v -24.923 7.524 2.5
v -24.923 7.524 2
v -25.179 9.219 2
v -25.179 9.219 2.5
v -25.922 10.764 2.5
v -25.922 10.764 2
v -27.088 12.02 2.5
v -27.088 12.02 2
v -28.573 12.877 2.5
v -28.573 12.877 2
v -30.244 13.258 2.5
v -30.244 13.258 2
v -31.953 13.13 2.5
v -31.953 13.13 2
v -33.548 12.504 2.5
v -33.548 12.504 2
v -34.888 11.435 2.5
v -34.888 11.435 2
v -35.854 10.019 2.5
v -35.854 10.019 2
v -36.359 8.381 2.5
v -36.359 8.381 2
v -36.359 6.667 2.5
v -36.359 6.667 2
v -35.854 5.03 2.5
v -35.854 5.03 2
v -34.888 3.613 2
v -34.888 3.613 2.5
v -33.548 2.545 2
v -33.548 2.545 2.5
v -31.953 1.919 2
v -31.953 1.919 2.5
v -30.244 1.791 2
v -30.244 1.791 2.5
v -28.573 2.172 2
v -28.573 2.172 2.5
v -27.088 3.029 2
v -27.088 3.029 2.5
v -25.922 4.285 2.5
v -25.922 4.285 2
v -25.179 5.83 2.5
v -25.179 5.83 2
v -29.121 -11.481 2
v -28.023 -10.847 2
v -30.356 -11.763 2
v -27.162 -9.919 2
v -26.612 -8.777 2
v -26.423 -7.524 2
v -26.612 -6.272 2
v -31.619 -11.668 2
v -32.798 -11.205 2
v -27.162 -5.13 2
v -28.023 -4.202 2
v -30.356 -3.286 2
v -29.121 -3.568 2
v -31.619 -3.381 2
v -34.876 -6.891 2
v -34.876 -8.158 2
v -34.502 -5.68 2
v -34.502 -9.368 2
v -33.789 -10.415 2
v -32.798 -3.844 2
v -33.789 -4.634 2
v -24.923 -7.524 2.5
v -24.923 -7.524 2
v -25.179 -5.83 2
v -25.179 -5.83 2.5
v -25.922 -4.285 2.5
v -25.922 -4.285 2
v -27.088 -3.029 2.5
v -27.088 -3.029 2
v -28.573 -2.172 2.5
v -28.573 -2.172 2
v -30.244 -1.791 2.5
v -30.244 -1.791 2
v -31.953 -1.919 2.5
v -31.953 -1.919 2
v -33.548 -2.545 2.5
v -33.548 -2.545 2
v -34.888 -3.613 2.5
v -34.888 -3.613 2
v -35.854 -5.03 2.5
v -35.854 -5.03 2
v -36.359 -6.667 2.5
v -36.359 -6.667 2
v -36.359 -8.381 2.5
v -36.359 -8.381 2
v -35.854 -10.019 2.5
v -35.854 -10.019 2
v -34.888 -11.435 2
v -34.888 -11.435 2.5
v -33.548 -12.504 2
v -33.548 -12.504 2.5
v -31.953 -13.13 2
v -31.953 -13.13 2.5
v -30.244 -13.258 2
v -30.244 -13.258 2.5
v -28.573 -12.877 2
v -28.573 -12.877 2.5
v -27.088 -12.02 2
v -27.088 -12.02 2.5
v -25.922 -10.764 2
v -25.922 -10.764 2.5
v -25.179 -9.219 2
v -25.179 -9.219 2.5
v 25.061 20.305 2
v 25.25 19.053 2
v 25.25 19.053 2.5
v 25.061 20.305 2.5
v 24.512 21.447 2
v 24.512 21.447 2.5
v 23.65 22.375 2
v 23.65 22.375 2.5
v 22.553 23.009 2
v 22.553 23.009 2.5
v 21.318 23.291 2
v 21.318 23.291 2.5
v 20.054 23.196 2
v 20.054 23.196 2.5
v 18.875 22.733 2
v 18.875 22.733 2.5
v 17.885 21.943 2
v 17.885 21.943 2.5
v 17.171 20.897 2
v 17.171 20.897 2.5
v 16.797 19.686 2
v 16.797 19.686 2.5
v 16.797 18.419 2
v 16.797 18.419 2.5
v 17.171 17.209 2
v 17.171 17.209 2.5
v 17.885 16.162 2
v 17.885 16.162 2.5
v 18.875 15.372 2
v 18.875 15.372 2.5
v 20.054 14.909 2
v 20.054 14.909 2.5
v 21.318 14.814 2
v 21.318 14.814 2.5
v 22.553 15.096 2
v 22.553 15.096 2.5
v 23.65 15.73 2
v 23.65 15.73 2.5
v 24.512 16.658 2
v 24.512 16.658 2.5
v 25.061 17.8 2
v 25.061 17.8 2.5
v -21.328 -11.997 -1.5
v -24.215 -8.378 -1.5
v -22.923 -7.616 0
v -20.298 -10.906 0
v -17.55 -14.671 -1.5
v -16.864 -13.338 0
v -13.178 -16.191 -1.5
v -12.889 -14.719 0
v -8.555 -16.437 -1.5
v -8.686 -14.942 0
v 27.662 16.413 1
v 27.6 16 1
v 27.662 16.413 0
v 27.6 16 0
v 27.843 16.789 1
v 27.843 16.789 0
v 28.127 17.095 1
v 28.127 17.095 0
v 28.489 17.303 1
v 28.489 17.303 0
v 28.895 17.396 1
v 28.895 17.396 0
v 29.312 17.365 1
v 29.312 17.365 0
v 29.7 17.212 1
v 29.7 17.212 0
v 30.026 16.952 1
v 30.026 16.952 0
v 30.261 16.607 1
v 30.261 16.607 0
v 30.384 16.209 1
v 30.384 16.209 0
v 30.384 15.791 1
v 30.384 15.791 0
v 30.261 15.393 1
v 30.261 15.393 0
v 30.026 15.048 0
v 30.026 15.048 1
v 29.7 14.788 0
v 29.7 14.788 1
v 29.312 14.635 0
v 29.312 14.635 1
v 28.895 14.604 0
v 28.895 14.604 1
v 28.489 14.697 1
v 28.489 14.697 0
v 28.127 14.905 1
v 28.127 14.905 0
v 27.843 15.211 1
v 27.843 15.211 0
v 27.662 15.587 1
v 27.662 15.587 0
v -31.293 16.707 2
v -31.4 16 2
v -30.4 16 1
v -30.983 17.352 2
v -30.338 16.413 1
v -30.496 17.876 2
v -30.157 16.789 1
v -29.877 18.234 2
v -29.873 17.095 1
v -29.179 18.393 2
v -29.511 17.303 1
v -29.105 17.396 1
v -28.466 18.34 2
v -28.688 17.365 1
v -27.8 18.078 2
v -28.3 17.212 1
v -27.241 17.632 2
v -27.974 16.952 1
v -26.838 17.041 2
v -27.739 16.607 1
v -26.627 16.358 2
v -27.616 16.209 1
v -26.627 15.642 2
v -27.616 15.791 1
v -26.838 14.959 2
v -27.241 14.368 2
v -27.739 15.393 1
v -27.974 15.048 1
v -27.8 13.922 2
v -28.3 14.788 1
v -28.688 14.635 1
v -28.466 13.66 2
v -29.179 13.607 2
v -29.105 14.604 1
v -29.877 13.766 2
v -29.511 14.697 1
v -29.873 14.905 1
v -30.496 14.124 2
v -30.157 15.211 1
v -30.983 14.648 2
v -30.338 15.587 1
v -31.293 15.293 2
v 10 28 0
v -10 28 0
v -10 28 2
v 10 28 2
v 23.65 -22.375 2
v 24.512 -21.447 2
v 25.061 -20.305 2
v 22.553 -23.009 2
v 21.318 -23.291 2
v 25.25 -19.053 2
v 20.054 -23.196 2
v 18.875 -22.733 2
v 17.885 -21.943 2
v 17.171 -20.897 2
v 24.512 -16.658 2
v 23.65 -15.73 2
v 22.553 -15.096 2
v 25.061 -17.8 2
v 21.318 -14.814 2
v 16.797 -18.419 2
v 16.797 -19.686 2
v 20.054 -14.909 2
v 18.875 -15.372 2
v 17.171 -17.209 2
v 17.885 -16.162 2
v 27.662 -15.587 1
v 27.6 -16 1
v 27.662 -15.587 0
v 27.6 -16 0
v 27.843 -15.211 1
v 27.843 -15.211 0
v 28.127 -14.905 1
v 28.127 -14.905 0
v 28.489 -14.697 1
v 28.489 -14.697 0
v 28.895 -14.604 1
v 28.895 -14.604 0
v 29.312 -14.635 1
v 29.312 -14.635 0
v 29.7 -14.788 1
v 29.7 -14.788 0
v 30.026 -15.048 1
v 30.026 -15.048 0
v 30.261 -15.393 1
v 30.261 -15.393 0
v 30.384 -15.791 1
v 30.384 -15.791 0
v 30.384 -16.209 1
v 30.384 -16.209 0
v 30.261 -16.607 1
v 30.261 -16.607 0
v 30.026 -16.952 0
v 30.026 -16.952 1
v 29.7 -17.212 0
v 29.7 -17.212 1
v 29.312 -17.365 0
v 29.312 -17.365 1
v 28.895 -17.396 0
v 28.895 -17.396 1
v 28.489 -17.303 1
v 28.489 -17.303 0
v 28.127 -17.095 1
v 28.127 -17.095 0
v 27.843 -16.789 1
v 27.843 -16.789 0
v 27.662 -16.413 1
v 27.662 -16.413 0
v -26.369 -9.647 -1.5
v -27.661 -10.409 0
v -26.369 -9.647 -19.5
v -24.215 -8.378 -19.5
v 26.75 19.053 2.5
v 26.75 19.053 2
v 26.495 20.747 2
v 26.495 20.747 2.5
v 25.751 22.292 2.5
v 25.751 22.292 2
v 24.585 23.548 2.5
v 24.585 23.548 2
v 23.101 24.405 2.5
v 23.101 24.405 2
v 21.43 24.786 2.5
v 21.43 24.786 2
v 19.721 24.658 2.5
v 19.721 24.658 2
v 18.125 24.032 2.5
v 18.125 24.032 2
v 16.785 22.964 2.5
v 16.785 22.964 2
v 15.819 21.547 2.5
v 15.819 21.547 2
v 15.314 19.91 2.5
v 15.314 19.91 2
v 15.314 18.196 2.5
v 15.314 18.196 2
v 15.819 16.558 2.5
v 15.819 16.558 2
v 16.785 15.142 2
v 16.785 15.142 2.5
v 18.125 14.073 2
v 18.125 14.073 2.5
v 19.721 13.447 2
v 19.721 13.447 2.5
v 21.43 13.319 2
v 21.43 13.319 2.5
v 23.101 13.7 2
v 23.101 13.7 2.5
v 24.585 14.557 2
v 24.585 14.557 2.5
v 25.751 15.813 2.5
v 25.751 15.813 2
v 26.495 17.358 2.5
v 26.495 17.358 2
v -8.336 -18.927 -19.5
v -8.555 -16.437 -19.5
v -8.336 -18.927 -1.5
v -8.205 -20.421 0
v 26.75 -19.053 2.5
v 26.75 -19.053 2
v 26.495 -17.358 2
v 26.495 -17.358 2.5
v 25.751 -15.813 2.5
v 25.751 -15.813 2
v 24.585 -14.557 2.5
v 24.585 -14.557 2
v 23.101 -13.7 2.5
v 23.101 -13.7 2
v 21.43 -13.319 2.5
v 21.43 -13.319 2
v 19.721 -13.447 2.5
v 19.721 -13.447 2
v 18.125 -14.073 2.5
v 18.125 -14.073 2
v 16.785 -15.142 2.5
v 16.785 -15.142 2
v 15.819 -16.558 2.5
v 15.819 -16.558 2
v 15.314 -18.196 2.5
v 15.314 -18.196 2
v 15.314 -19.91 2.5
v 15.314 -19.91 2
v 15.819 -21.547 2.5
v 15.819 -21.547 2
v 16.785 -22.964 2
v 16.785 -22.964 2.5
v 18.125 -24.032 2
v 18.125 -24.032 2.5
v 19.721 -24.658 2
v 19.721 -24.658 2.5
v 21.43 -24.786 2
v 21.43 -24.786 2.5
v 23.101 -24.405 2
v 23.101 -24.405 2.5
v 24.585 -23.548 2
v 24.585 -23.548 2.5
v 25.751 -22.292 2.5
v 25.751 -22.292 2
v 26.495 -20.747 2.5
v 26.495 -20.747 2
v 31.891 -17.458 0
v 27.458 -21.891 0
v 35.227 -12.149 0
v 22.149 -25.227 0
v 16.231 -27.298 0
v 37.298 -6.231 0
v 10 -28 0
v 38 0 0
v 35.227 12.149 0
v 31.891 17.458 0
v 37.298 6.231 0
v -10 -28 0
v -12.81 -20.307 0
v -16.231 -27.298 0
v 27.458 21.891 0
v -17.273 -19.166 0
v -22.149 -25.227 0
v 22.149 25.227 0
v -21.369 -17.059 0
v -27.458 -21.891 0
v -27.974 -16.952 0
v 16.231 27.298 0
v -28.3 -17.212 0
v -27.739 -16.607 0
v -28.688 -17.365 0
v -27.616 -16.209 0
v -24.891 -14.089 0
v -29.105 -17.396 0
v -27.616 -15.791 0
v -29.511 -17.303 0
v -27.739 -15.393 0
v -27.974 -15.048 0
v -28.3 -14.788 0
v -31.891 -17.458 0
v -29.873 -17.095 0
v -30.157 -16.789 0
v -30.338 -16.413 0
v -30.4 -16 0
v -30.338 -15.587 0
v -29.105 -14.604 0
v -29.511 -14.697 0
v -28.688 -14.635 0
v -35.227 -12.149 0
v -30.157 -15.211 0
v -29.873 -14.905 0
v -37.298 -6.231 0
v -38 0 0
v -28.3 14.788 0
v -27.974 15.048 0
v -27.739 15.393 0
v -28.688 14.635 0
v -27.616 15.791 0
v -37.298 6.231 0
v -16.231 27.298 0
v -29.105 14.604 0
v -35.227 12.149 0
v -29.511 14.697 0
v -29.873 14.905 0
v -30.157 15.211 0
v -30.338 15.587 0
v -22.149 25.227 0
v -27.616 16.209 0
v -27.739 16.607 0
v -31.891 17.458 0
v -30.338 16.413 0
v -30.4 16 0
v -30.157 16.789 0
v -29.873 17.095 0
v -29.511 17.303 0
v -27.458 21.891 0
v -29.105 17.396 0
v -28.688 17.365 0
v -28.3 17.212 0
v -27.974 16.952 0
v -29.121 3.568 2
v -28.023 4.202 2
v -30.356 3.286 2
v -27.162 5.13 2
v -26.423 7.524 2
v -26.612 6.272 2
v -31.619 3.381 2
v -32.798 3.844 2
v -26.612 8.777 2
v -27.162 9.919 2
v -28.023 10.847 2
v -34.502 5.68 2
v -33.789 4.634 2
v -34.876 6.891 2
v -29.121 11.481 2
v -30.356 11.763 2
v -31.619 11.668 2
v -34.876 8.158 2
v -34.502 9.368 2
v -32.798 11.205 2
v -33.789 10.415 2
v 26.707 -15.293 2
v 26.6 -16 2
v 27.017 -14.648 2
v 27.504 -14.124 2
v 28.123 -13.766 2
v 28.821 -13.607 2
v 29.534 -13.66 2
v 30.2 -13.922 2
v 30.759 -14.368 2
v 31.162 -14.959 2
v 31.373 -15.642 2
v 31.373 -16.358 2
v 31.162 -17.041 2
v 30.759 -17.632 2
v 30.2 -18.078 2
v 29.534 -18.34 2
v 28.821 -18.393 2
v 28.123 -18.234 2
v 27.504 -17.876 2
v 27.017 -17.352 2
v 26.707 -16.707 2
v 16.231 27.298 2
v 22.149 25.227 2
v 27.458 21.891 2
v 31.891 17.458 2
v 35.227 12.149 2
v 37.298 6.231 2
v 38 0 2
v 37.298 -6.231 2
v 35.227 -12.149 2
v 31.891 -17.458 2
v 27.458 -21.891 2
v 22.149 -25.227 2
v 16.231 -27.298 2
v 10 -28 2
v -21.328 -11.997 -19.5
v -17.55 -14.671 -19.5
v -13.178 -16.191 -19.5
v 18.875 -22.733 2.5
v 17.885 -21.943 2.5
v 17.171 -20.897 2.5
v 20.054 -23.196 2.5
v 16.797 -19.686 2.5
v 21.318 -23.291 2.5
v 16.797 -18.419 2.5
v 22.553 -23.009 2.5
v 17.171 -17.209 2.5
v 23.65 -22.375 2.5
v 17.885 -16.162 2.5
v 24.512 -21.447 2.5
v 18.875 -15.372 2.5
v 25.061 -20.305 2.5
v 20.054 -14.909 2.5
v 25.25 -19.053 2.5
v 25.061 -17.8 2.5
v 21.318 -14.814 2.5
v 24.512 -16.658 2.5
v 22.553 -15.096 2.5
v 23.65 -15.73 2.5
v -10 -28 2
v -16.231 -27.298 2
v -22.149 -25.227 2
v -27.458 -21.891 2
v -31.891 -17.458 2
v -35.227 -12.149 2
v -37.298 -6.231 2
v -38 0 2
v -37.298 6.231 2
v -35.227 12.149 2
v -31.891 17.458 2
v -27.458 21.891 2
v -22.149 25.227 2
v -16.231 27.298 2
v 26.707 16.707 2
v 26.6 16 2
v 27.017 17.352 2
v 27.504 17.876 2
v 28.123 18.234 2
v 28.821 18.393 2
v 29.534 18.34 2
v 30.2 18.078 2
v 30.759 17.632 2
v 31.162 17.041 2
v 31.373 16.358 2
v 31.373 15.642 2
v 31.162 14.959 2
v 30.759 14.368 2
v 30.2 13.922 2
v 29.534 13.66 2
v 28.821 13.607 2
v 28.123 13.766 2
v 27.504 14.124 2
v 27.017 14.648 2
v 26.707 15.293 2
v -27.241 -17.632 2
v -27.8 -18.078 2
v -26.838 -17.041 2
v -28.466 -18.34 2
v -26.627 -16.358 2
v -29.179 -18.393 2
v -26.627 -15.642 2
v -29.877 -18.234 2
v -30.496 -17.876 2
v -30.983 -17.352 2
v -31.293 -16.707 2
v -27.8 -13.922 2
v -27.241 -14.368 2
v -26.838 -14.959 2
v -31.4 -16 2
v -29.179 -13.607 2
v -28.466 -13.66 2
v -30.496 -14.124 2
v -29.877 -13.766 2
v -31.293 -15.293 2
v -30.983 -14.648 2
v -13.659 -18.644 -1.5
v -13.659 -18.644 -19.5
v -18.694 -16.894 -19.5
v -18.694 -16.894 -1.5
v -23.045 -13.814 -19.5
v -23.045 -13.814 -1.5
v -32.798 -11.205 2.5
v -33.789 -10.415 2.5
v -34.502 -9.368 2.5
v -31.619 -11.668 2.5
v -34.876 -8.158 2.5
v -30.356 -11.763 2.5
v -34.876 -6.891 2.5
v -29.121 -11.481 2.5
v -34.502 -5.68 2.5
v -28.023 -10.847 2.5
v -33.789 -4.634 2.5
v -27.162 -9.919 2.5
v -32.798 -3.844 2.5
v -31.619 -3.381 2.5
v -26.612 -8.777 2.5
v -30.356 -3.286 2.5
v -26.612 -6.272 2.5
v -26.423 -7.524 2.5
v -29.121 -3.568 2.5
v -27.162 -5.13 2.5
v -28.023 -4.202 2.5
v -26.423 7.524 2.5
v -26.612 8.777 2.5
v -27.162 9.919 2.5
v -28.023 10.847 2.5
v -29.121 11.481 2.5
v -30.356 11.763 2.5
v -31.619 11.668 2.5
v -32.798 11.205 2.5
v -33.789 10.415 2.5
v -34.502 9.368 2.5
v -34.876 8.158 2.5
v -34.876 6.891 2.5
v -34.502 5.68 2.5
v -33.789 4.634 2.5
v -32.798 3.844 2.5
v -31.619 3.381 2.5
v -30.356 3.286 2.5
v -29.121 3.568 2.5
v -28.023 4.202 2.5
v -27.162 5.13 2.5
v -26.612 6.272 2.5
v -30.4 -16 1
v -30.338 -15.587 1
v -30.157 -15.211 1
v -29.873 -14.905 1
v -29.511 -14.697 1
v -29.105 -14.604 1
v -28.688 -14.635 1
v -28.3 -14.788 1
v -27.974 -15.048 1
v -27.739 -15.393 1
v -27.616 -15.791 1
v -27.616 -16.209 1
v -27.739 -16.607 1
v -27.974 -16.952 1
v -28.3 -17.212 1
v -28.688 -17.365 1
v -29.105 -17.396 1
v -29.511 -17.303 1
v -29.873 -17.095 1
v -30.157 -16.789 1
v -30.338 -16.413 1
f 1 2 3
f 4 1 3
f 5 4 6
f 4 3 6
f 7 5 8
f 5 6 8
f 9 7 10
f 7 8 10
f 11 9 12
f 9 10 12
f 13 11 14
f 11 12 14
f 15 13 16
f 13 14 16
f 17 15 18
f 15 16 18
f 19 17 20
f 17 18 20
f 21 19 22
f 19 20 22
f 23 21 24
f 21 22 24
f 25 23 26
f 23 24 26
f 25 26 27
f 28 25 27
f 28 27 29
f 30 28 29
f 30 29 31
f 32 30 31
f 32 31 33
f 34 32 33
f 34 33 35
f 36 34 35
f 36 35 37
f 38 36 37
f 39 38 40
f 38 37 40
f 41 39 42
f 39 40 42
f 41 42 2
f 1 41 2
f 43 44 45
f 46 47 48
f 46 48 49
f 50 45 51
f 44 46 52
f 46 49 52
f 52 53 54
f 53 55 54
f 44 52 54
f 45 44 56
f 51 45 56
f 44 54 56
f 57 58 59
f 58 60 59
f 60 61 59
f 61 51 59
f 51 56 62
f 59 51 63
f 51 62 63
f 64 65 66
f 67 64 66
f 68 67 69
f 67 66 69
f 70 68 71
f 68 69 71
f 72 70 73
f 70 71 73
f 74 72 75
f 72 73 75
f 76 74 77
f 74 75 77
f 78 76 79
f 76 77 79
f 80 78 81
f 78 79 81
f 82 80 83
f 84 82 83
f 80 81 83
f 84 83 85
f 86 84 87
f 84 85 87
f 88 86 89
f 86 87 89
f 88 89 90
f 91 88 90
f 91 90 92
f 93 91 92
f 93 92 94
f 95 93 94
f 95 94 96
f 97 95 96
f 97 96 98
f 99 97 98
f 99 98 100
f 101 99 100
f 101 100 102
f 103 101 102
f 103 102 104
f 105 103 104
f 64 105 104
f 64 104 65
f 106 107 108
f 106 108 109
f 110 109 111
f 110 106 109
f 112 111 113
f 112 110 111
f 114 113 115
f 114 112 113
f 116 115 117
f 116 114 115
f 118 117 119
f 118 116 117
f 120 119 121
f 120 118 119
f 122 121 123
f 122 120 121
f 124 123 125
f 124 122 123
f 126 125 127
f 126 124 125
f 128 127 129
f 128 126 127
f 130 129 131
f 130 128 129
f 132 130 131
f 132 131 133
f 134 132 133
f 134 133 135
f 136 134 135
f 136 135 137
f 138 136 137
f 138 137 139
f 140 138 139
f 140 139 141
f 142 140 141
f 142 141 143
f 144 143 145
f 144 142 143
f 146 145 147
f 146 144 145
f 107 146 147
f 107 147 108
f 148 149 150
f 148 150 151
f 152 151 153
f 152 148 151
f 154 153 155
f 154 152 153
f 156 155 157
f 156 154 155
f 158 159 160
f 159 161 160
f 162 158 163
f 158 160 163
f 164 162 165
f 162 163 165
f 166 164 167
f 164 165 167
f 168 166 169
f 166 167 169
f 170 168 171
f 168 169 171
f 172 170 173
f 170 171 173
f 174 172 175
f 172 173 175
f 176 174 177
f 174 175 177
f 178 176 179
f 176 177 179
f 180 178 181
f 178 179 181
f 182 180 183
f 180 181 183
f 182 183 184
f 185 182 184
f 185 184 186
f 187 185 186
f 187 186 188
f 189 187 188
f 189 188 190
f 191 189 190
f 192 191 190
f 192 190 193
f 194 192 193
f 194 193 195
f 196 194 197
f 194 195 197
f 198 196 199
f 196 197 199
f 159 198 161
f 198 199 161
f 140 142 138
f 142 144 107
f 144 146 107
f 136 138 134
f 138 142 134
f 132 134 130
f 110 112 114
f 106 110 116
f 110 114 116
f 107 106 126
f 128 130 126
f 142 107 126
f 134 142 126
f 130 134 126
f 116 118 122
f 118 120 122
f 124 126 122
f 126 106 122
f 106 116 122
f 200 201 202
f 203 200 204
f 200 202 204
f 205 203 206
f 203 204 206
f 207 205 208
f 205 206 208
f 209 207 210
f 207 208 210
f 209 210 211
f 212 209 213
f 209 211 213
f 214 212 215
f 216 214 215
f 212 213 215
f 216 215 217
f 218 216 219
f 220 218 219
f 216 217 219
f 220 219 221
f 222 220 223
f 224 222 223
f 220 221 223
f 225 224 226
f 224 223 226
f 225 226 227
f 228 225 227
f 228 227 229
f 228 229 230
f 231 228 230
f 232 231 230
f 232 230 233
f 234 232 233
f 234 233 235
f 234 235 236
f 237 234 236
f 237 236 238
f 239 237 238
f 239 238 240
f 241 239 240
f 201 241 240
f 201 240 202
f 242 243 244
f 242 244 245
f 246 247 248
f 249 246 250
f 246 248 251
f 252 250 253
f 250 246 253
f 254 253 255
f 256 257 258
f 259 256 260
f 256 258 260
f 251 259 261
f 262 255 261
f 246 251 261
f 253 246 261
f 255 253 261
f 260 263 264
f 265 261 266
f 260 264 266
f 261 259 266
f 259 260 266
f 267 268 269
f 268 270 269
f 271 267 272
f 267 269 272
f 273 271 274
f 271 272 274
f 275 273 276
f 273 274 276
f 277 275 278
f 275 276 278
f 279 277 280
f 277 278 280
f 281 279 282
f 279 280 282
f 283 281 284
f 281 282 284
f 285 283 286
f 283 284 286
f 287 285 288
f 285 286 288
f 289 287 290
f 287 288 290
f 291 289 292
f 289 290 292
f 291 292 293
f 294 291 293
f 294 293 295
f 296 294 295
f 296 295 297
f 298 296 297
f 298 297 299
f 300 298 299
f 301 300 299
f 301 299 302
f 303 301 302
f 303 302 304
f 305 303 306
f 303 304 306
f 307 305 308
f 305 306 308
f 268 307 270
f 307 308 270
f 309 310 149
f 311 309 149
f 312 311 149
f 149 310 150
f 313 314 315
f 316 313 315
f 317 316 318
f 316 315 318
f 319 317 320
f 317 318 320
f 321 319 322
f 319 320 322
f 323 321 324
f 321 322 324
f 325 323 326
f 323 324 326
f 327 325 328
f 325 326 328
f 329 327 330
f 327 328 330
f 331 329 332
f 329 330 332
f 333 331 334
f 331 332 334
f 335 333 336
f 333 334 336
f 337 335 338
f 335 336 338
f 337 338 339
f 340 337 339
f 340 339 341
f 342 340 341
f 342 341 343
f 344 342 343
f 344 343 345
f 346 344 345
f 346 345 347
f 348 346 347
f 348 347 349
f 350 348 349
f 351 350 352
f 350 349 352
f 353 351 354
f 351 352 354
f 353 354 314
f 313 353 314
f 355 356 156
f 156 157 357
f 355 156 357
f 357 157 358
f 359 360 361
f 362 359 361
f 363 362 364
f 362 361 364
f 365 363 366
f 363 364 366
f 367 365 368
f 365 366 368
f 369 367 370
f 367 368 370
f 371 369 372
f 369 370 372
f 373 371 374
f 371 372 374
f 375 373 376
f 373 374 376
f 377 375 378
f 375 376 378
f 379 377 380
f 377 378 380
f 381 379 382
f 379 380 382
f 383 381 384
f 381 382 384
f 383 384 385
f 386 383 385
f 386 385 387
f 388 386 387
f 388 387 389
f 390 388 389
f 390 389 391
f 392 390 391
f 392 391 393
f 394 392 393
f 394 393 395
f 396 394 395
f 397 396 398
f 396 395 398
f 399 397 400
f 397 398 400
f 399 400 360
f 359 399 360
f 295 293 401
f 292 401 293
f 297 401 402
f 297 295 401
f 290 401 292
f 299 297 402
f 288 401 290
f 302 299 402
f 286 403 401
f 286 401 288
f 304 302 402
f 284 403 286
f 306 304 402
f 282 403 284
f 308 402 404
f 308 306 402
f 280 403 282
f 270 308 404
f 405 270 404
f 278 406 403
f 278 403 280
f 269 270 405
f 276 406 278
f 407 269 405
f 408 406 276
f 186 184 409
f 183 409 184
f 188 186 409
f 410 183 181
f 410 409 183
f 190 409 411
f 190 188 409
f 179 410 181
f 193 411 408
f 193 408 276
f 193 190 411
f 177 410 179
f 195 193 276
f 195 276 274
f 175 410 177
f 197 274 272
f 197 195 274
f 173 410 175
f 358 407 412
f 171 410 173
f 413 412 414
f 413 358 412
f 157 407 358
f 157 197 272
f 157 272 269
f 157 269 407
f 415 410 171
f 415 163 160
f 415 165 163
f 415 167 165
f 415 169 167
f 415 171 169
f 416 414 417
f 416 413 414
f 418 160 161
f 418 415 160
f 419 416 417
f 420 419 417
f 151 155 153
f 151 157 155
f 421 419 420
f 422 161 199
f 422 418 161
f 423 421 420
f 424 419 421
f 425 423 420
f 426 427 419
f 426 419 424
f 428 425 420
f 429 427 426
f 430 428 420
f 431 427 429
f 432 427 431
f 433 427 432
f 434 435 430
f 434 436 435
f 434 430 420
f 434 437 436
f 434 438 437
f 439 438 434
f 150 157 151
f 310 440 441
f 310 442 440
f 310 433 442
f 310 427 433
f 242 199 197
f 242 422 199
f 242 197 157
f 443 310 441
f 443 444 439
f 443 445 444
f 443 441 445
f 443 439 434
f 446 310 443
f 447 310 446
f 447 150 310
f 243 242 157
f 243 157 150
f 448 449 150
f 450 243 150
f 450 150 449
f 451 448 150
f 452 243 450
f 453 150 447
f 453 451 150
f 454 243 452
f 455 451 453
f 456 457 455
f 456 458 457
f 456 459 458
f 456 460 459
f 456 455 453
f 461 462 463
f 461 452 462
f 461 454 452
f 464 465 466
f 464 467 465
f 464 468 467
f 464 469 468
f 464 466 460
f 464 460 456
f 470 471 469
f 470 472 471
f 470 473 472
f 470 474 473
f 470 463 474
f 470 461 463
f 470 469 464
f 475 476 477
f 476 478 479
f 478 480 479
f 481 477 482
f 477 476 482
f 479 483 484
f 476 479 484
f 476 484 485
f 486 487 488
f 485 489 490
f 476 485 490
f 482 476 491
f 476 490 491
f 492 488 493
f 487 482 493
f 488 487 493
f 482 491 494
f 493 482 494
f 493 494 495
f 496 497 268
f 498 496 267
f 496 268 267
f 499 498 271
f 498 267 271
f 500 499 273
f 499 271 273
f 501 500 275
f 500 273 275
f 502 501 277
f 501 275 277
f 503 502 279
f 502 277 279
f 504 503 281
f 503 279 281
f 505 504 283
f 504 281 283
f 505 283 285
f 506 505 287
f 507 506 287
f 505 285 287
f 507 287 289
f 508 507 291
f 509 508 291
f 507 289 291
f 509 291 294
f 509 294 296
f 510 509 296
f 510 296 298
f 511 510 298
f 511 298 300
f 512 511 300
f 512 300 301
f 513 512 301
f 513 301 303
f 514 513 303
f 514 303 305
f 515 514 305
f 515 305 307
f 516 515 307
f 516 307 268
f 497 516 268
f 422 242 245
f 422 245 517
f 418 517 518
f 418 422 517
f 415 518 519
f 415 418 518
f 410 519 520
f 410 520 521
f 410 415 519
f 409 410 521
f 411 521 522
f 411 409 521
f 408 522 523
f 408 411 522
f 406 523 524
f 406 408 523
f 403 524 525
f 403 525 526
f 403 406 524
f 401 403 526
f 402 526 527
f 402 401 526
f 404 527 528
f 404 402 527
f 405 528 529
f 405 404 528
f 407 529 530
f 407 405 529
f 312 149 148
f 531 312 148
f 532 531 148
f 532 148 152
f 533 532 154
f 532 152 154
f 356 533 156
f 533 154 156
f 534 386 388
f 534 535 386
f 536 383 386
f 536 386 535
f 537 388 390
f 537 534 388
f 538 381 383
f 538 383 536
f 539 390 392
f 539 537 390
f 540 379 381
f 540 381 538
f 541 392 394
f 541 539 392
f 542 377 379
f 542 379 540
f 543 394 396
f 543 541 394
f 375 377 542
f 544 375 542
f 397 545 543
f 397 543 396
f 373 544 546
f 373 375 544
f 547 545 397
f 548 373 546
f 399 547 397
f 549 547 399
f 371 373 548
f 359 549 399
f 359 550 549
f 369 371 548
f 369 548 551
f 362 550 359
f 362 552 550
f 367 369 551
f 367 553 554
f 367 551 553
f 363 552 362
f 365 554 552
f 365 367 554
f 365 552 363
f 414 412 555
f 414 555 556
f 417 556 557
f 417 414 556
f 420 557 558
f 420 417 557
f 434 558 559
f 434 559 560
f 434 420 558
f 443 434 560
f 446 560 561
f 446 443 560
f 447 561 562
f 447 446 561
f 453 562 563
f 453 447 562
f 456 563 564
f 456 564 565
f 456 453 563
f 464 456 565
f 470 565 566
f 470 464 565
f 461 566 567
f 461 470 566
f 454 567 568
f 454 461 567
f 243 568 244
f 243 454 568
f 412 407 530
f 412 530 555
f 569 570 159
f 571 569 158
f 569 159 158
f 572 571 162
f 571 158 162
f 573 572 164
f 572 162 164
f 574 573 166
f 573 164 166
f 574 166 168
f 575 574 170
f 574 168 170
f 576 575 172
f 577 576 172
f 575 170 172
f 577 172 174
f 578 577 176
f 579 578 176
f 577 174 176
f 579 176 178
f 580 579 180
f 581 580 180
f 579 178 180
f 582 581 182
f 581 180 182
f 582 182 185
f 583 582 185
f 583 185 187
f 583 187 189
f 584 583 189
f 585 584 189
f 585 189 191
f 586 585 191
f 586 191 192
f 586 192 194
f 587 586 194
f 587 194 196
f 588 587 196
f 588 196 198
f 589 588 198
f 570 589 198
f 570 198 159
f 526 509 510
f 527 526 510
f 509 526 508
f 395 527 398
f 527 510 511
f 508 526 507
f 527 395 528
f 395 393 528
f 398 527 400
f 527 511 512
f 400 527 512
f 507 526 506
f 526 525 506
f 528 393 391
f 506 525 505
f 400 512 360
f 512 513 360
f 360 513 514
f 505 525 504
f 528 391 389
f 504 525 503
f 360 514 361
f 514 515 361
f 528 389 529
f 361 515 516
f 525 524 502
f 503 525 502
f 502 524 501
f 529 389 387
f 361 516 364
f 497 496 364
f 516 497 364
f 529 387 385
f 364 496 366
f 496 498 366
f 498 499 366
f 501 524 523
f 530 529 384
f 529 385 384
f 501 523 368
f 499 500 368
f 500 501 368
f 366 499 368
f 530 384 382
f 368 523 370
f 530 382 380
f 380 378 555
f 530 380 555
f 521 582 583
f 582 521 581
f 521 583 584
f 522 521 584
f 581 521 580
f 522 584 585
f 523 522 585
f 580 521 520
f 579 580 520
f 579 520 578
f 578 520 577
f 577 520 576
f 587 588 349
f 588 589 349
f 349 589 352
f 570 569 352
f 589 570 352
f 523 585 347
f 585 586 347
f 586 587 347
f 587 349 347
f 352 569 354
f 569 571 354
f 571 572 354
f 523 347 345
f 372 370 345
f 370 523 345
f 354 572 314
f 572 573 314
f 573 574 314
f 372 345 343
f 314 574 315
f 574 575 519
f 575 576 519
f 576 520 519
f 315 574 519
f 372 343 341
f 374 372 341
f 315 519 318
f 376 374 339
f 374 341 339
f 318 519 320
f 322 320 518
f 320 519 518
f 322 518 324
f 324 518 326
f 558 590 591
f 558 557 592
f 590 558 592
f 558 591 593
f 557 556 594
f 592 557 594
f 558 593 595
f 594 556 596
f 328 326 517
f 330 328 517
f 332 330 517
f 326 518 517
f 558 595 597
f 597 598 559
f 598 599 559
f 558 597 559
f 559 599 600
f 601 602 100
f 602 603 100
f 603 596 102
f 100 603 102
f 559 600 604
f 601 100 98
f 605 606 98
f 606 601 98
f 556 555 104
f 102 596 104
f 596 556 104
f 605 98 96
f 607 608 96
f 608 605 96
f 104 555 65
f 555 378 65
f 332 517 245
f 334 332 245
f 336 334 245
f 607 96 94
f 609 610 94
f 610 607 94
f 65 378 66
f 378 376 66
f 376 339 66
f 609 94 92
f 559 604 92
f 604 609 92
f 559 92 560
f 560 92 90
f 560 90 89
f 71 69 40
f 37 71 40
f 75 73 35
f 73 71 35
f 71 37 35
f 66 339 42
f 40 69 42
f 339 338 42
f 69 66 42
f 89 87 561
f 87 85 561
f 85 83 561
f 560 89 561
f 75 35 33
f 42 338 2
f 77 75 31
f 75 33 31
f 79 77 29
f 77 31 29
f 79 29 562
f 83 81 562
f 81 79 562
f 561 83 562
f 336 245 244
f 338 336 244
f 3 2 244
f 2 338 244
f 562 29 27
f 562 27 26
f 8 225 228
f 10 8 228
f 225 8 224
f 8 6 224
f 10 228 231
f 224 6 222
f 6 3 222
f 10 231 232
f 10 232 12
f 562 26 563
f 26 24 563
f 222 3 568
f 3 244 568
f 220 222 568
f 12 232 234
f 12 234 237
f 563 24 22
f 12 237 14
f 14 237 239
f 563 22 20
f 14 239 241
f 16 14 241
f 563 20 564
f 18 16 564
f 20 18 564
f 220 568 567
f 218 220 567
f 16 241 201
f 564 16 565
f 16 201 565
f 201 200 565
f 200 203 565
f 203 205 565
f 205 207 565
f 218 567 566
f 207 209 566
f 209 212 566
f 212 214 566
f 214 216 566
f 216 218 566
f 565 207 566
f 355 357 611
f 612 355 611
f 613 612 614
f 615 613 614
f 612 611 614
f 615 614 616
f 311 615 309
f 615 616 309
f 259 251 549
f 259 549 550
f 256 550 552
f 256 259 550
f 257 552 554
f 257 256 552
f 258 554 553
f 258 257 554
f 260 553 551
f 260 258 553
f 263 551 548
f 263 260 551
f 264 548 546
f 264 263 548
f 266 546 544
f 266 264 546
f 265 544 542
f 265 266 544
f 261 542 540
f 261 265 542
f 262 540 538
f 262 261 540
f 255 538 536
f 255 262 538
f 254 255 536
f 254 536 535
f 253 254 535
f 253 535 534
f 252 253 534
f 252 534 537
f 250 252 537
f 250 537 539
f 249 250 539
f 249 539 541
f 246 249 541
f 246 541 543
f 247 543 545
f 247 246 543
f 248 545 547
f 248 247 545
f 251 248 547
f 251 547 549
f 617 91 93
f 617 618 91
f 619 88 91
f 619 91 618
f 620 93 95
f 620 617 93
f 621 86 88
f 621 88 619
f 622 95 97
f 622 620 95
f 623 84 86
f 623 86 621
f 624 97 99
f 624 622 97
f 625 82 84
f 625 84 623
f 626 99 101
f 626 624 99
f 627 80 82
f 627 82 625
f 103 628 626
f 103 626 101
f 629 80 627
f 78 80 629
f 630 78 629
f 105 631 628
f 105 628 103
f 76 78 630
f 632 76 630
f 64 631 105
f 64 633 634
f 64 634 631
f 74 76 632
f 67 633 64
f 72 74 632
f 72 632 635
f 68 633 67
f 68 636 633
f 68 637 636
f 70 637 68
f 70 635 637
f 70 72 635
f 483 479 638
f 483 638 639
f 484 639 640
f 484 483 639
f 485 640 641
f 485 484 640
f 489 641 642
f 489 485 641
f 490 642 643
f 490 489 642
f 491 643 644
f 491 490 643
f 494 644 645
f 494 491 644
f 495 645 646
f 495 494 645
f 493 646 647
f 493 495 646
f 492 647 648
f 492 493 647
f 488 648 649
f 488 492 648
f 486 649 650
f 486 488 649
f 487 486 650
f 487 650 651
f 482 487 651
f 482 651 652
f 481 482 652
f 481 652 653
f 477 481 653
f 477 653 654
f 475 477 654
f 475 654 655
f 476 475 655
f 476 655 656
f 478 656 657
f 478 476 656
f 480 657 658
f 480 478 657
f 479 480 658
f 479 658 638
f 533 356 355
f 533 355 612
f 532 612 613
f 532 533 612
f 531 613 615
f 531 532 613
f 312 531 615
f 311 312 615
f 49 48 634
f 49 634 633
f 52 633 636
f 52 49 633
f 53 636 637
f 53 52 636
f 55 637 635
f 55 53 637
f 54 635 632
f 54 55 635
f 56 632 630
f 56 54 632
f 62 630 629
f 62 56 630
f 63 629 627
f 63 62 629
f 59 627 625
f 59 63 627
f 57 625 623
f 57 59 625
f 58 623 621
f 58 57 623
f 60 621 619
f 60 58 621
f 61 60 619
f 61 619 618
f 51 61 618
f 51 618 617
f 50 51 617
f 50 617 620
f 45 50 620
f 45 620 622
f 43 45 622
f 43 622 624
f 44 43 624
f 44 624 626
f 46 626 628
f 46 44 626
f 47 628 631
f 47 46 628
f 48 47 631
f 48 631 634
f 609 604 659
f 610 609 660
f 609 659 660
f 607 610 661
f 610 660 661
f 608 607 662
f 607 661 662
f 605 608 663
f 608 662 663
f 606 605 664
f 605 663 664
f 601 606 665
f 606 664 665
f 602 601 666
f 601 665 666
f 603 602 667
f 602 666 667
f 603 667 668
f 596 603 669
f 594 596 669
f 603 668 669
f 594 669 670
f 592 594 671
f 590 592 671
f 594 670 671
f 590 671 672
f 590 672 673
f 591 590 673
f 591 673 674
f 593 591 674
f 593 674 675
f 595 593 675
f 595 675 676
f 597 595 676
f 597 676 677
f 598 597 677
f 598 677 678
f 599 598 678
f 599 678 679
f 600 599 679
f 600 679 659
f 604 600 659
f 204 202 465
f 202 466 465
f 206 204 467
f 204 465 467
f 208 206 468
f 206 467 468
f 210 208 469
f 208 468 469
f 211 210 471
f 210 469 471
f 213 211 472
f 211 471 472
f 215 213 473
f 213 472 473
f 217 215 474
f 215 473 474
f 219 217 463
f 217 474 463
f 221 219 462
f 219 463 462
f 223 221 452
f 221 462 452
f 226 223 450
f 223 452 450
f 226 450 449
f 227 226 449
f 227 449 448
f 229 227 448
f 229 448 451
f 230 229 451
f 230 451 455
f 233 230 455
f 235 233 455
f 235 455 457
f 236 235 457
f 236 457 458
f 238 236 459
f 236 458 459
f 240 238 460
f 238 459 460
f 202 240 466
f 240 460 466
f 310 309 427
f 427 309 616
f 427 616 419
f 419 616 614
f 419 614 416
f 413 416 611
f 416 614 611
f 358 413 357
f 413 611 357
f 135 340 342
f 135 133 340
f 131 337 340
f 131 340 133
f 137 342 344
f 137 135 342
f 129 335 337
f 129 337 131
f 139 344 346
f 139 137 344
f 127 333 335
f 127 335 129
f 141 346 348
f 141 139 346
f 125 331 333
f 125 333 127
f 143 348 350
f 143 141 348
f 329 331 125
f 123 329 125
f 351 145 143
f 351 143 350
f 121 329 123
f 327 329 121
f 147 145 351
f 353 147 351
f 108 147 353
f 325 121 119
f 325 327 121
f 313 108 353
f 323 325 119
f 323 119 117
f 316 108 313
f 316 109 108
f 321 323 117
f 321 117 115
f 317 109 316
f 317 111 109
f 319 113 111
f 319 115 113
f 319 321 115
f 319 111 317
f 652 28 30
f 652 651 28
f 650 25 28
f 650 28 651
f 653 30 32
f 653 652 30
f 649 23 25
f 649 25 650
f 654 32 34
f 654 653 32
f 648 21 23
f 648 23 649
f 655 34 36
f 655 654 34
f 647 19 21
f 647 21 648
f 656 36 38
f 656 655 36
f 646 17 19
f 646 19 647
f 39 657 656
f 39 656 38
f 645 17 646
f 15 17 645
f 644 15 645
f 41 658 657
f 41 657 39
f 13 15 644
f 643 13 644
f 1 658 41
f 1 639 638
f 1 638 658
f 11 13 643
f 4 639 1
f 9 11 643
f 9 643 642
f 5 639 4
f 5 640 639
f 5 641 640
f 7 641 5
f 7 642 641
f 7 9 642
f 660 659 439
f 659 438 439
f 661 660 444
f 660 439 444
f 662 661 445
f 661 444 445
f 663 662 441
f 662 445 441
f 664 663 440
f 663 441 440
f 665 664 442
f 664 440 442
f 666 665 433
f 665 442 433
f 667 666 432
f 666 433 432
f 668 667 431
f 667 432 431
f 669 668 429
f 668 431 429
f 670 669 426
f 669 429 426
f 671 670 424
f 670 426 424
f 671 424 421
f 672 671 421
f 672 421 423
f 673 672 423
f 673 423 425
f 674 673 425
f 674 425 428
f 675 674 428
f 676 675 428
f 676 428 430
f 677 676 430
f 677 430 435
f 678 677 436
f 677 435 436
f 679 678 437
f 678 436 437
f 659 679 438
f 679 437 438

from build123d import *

# Parameters (mm, degrees)
EXTRUDE_2_DEPTH           = 2
HOLE_WIZARD_0_D           = 2.8
HOLE_WIZARD_0_DEPTH       = 10.1
HOLE_WIZARD_0_CSINK_D     = 4.8
HOLE_WIZARD_0_CSINK_ANGLE = 90
HOLE_WIZARD_0_TIP         = 0.841204867
SKETCH_7_R                = 5.75
SKETCH_7_R_2              = 4.25
EXTRUDE_1_DEPTH           = 0.5
EXTRUDE_2_2_DEPTH         = 21.5
CHAMFER_1_SIZE            = 1.5


with BuildPart() as part:
    # 草图3 → Extrude 2 (new body)
    with BuildSketch(Plane.XY):
        with BuildLine():
            Line((10, -28), (-10, -28))
            ThreePointArc((-10, -28), (-38, 0), (-10, 28))
            Line((-10, 28), (10, 28))
            ThreePointArc((10, 28), (38, 0), (10, -28))
        make_face()
    extrude(amount=EXTRUDE_2_DEPTH)

    # 打孔尺寸(%根据十字)槽沉头自攻螺钉的类型0
    with Locations(Plane.XY.offset(2)):
        with Locations((-29, 16), (-29, -16), (29, 16), (29, -16)):
            CounterSinkHole(HOLE_WIZARD_0_D / 2, HOLE_WIZARD_0_CSINK_D / 2, depth=HOLE_WIZARD_0_DEPTH, counter_sink_angle=HOLE_WIZARD_0_CSINK_ANGLE)
            with Locations((0, 0, -(HOLE_WIZARD_0_DEPTH + HOLE_WIZARD_0_TIP / 2))):  # 118° drill point
                Cone(0, HOLE_WIZARD_0_D / 2, HOLE_WIZARD_0_TIP, mode=Mode.SUBTRACT)

    # 草图7 → 拉伸-薄壁1 (add)
    # profile 1 of 4: a face of its own
    with BuildSketch(Plane.XY.offset(2)):
        with Locations((-30.673237657, 7.524443153)):
            Circle(SKETCH_7_R)
        with Locations((-30.673237657, 7.524443153)):
            Circle(SKETCH_7_R_2, mode=Mode.SUBTRACT)
    # profile 2 of 4: a face of its own
    with BuildSketch(Plane.XY.offset(2)):
        with Locations((-30.673237657, -7.524443153)):
            Circle(SKETCH_7_R)
        with Locations((-30.673237657, -7.524443153)):
            Circle(SKETCH_7_R_2, mode=Mode.SUBTRACT)
    # profile 3 of 4: a face of its own
    with BuildSketch(Plane.XY.offset(2)):
        with Locations((21, -19.052558883)):
            Circle(SKETCH_7_R)
        with Locations((21, -19.052558883)):
            Circle(SKETCH_7_R_2, mode=Mode.SUBTRACT)
    # profile 4 of 4: a face of its own
    with BuildSketch(Plane.XY.offset(2)):
        with Locations((21, 19.052558883)):
            Circle(SKETCH_7_R)
        with Locations((21, 19.052558883)):
            Circle(SKETCH_7_R_2, mode=Mode.SUBTRACT)
    extrude(amount=EXTRUDE_1_DEPTH)

    # 草图10 → Extrude 2 2 (add)
    with BuildSketch(Plane.XY.offset(2)):
        with BuildLine():
            ThreePointArc((-24.214911699, -8.37772555), (-17.550101998, -14.671263061), (-8.554999344, -16.436604671))
            Line((-8.554999344, -16.436604671), (-8.336059851, -18.926999318))
            ThreePointArc((-8.336059851, -18.926999318), (-18.694056847, -16.894181707), (-26.368686199, -9.647077906))
            Line((-26.368686199, -9.647077906), (-24.214911699, -8.37772555))
        make_face()
    extrude(amount=-EXTRUDE_2_2_DEPTH)

    # 倒角1
    chamfer_1_edges = [part.edges().sort_by_distance(p)[0] for p in [
        (-17.550101998, -14.671263061, 0),
        (-18.694056847, -16.894181707, 0),
    ]]
    chamfer(chamfer_1_edges, length=CHAMFER_1_SIZE)


solid = part.part
